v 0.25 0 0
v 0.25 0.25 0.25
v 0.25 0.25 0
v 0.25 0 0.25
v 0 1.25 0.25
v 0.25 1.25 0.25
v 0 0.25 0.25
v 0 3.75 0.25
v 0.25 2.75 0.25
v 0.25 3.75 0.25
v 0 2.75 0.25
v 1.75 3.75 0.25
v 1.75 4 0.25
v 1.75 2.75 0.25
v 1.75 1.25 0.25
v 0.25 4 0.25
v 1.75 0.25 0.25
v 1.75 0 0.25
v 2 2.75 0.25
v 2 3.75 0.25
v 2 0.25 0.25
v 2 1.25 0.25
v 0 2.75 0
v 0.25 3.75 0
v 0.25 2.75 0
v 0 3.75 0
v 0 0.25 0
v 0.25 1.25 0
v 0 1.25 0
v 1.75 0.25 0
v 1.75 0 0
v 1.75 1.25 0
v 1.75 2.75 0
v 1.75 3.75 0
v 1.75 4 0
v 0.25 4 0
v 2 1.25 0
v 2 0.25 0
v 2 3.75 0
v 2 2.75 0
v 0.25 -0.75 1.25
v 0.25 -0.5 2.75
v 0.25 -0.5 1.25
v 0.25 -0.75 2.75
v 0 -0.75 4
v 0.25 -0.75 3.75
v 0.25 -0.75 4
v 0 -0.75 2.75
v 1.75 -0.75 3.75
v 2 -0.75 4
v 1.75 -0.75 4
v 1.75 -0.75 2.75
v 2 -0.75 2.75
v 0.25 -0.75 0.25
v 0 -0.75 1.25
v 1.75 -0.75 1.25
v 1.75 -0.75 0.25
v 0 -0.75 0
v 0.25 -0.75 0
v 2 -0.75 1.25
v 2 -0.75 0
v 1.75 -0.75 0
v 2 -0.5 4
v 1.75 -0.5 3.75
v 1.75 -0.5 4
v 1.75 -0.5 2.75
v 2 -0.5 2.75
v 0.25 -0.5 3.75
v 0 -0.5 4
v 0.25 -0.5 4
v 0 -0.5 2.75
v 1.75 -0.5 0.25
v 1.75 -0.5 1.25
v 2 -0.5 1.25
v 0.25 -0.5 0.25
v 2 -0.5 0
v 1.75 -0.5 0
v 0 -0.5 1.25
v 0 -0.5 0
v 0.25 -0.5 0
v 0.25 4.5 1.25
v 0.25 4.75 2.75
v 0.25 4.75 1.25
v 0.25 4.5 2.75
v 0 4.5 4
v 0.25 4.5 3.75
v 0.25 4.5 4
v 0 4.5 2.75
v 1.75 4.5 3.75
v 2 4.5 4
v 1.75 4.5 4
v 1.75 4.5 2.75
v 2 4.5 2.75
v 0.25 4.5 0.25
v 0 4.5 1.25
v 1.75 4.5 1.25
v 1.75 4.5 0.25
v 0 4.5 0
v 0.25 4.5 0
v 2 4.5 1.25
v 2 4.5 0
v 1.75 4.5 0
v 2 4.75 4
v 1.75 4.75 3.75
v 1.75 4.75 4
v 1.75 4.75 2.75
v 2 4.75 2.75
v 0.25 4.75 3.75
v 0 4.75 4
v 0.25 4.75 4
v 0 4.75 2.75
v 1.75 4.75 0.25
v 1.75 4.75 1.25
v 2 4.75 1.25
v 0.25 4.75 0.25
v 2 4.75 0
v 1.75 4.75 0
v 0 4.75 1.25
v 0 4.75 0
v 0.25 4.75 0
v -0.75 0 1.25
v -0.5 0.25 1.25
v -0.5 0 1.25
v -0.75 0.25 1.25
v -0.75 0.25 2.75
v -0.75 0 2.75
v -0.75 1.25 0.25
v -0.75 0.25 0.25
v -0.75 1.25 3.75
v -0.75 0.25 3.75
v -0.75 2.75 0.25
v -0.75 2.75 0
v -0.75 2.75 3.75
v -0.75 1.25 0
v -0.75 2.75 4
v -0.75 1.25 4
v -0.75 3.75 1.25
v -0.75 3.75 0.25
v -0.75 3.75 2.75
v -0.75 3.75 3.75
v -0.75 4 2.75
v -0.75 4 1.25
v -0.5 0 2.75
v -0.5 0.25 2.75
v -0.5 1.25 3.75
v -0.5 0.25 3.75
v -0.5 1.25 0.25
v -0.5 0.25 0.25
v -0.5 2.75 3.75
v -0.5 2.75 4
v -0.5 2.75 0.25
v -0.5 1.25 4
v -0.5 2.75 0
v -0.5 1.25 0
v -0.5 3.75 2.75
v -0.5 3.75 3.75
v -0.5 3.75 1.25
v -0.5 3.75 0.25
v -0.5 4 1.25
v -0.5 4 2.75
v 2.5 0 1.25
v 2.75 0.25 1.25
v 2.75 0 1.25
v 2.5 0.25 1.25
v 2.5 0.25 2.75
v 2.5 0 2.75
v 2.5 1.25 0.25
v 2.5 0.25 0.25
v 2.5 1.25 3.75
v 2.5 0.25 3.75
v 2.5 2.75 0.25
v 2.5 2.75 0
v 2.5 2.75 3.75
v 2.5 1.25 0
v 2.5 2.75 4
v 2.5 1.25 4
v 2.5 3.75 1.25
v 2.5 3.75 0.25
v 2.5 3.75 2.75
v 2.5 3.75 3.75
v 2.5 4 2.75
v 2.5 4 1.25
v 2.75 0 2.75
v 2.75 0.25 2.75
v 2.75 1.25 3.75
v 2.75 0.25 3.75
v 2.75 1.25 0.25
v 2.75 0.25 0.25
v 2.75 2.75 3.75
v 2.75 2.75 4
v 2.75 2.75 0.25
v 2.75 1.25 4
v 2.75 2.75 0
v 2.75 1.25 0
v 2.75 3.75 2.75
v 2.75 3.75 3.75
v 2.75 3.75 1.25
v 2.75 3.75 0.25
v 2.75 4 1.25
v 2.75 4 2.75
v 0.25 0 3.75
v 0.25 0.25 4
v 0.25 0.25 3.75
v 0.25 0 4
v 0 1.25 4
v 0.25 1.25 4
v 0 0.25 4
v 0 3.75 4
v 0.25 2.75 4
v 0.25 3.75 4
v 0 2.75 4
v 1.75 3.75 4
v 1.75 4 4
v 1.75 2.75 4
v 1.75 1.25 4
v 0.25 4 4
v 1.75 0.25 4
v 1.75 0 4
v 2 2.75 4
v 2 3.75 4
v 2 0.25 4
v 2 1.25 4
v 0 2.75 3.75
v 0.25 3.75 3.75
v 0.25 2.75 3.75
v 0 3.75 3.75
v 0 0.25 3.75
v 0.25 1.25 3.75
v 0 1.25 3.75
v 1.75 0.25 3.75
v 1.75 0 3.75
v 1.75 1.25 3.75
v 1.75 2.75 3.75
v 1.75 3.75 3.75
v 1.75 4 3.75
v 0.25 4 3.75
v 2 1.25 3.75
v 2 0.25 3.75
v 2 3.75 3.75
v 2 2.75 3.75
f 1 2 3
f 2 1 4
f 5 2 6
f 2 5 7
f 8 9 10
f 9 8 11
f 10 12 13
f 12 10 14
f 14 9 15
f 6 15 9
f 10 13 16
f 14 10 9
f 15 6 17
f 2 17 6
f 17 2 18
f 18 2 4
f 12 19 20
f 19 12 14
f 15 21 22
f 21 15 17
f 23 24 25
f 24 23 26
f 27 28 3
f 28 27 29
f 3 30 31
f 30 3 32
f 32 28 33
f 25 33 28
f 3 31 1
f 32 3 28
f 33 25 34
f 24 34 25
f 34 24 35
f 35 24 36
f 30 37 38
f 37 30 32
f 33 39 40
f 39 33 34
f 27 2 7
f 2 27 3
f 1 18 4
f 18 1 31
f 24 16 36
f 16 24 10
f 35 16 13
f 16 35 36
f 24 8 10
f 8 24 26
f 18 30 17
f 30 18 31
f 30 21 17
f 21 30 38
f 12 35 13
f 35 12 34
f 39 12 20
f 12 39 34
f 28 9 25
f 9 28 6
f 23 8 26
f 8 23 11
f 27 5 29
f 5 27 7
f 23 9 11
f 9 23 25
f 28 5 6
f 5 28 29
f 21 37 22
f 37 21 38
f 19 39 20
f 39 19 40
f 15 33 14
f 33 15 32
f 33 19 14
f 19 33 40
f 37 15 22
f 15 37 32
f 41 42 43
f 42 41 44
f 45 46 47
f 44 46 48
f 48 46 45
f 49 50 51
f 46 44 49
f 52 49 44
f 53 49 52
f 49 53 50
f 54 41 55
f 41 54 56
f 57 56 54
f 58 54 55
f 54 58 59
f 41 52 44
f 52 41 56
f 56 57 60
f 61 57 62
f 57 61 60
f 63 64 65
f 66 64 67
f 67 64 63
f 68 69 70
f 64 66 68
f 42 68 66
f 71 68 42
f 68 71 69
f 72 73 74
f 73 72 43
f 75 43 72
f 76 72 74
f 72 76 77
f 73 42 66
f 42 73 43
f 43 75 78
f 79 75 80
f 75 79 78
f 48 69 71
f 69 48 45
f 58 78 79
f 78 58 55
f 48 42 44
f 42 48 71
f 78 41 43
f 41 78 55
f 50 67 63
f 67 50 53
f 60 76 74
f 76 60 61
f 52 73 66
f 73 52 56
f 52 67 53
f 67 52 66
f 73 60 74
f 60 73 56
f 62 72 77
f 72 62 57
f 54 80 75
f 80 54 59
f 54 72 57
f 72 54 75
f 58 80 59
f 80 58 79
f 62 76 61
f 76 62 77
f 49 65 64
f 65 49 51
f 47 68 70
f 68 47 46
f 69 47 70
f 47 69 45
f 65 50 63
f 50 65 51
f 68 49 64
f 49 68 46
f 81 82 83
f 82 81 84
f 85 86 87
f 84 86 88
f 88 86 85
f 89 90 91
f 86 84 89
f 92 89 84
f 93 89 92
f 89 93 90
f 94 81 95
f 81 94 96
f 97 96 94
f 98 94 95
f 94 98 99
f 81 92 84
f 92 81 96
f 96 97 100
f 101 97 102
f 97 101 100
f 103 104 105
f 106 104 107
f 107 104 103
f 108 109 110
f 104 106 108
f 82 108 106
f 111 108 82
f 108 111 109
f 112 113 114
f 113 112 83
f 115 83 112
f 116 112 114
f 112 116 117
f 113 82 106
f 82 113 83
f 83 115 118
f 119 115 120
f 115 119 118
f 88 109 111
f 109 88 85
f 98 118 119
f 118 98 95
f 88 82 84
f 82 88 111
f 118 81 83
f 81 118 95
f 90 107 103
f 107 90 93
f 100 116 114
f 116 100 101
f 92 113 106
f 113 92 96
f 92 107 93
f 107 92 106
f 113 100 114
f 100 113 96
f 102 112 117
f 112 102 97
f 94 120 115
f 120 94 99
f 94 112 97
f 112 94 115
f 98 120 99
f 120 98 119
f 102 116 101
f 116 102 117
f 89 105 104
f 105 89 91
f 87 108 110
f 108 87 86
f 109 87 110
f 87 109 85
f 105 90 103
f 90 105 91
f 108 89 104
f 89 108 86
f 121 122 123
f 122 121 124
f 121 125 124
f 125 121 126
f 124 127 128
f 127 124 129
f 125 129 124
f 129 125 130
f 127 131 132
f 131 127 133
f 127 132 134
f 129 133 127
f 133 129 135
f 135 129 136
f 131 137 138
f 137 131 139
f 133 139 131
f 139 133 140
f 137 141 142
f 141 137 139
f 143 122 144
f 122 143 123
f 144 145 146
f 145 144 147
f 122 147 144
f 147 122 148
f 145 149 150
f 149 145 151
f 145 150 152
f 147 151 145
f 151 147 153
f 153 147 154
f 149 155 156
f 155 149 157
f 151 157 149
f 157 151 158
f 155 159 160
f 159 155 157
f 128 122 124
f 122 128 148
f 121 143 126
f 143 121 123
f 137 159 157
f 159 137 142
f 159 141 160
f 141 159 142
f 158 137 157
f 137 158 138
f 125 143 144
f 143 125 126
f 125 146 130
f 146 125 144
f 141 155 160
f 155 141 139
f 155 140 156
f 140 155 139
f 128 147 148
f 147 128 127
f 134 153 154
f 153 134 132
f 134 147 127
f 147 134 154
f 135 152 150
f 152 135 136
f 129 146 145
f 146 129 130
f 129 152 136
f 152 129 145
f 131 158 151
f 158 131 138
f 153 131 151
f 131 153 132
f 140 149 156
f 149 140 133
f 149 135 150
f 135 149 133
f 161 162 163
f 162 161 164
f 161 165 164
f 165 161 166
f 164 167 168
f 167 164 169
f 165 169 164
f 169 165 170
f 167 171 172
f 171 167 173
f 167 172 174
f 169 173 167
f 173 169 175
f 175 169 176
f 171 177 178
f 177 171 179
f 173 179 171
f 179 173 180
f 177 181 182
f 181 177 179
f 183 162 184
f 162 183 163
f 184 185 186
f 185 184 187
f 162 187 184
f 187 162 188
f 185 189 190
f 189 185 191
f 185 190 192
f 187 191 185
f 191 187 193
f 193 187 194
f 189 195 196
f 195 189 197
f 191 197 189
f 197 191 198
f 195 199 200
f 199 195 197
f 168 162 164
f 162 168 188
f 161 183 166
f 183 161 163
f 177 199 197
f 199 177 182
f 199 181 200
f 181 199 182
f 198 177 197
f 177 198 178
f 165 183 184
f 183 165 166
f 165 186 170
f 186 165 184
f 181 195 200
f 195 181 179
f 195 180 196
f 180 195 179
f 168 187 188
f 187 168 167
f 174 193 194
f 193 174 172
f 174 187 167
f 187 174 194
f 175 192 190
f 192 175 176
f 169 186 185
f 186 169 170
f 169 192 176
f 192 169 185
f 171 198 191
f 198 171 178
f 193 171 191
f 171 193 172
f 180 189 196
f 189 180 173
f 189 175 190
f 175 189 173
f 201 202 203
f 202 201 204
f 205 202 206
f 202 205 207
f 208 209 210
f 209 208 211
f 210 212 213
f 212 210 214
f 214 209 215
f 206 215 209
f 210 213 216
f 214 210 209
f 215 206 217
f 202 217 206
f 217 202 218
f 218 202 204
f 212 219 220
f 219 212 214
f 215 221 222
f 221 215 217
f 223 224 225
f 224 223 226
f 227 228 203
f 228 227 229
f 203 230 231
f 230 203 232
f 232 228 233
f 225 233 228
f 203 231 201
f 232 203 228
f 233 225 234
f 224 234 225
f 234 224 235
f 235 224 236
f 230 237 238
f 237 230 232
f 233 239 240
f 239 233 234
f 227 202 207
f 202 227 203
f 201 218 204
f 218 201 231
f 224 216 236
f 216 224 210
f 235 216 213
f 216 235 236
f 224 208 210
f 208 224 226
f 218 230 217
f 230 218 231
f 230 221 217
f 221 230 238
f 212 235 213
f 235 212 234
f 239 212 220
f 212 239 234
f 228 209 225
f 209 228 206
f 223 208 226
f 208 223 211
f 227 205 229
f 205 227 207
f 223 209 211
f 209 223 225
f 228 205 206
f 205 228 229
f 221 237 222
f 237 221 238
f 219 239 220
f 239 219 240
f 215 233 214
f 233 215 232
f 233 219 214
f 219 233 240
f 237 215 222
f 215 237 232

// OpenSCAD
WIDTH = 4;
HEIGHT = 4;
LENGTH = 2;
THICKNESS = .25;

TAB_LENGTH = 6 * THICKNESS;

module TabbedPanel(length, width, height, tab_x_filled=true, tab_y_filled=true)
{

    difference() {
        cube(size = [length, width, height]);
        tab_x_multiplier = tab_x_filled ? 1: -1;
        tab_y_multiplier = tab_y_filled ? 1: -1;
        x_center_offset = length/2 % TAB_LENGTH + .5 * TAB_LENGTH * tab_x_multiplier ;
        y_center_offset = width/2 % TAB_LENGTH + .5 * TAB_LENGTH * tab_y_multiplier;

        for ( i = [0 - (4*TAB_LENGTH): TAB_LENGTH * 2: LENGTH + WIDTH])
        {
            translate([i + x_center_offset, 0, 0]) cube([TAB_LENGTH , THICKNESS, THICKNESS]);
            translate([i + x_center_offset, width - THICKNESS, 0]) cube([TAB_LENGTH , THICKNESS, THICKNESS]);
        }
        for ( i = [0 - (4*TAB_LENGTH): TAB_LENGTH * 2: LENGTH + WIDTH] )
        {
            translate([0, i + y_center_offset, 0]) cube([THICKNESS , TAB_LENGTH, THICKNESS]);
            translate([length - THICKNESS, i + y_center_offset, 0]) cube([THICKNESS , TAB_LENGTH, THICKNESS]);
        }
    }
}

module Case()
{
    // Bottom
    TabbedPanel(LENGTH, WIDTH, THICKNESS);

    // Front
    translate([0, -2* THICKNESS, 0]) rotate([90, 0, 0]) TabbedPanel(LENGTH, HEIGHT, THICKNESS, tab_x_filled=false);

    // Back
    translate([0, WIDTH + 3* THICKNESS, 0]) rotate([90, 0, 0]) TabbedPanel(LENGTH, HEIGHT, THICKNESS, tab_x_filled=false);

    // Left
    translate([-2* THICKNESS, 0, 0]) rotate([0, 270, 0]) TabbedPanel(HEIGHT, WIDTH, THICKNESS, tab_x_filled=false, tab_y_filled=false);

    // Right
    translate([LENGTH + 3 * THICKNESS, 0, 0]) rotate([0, 270, 0]) TabbedPanel(HEIGHT, WIDTH, THICKNESS, tab_x_filled=false, tab_y_filled=false);

    // Top
    translate([0, 0, HEIGHT - THICKNESS]) TabbedPanel(LENGTH, WIDTH, THICKNESS);

}

Case();
